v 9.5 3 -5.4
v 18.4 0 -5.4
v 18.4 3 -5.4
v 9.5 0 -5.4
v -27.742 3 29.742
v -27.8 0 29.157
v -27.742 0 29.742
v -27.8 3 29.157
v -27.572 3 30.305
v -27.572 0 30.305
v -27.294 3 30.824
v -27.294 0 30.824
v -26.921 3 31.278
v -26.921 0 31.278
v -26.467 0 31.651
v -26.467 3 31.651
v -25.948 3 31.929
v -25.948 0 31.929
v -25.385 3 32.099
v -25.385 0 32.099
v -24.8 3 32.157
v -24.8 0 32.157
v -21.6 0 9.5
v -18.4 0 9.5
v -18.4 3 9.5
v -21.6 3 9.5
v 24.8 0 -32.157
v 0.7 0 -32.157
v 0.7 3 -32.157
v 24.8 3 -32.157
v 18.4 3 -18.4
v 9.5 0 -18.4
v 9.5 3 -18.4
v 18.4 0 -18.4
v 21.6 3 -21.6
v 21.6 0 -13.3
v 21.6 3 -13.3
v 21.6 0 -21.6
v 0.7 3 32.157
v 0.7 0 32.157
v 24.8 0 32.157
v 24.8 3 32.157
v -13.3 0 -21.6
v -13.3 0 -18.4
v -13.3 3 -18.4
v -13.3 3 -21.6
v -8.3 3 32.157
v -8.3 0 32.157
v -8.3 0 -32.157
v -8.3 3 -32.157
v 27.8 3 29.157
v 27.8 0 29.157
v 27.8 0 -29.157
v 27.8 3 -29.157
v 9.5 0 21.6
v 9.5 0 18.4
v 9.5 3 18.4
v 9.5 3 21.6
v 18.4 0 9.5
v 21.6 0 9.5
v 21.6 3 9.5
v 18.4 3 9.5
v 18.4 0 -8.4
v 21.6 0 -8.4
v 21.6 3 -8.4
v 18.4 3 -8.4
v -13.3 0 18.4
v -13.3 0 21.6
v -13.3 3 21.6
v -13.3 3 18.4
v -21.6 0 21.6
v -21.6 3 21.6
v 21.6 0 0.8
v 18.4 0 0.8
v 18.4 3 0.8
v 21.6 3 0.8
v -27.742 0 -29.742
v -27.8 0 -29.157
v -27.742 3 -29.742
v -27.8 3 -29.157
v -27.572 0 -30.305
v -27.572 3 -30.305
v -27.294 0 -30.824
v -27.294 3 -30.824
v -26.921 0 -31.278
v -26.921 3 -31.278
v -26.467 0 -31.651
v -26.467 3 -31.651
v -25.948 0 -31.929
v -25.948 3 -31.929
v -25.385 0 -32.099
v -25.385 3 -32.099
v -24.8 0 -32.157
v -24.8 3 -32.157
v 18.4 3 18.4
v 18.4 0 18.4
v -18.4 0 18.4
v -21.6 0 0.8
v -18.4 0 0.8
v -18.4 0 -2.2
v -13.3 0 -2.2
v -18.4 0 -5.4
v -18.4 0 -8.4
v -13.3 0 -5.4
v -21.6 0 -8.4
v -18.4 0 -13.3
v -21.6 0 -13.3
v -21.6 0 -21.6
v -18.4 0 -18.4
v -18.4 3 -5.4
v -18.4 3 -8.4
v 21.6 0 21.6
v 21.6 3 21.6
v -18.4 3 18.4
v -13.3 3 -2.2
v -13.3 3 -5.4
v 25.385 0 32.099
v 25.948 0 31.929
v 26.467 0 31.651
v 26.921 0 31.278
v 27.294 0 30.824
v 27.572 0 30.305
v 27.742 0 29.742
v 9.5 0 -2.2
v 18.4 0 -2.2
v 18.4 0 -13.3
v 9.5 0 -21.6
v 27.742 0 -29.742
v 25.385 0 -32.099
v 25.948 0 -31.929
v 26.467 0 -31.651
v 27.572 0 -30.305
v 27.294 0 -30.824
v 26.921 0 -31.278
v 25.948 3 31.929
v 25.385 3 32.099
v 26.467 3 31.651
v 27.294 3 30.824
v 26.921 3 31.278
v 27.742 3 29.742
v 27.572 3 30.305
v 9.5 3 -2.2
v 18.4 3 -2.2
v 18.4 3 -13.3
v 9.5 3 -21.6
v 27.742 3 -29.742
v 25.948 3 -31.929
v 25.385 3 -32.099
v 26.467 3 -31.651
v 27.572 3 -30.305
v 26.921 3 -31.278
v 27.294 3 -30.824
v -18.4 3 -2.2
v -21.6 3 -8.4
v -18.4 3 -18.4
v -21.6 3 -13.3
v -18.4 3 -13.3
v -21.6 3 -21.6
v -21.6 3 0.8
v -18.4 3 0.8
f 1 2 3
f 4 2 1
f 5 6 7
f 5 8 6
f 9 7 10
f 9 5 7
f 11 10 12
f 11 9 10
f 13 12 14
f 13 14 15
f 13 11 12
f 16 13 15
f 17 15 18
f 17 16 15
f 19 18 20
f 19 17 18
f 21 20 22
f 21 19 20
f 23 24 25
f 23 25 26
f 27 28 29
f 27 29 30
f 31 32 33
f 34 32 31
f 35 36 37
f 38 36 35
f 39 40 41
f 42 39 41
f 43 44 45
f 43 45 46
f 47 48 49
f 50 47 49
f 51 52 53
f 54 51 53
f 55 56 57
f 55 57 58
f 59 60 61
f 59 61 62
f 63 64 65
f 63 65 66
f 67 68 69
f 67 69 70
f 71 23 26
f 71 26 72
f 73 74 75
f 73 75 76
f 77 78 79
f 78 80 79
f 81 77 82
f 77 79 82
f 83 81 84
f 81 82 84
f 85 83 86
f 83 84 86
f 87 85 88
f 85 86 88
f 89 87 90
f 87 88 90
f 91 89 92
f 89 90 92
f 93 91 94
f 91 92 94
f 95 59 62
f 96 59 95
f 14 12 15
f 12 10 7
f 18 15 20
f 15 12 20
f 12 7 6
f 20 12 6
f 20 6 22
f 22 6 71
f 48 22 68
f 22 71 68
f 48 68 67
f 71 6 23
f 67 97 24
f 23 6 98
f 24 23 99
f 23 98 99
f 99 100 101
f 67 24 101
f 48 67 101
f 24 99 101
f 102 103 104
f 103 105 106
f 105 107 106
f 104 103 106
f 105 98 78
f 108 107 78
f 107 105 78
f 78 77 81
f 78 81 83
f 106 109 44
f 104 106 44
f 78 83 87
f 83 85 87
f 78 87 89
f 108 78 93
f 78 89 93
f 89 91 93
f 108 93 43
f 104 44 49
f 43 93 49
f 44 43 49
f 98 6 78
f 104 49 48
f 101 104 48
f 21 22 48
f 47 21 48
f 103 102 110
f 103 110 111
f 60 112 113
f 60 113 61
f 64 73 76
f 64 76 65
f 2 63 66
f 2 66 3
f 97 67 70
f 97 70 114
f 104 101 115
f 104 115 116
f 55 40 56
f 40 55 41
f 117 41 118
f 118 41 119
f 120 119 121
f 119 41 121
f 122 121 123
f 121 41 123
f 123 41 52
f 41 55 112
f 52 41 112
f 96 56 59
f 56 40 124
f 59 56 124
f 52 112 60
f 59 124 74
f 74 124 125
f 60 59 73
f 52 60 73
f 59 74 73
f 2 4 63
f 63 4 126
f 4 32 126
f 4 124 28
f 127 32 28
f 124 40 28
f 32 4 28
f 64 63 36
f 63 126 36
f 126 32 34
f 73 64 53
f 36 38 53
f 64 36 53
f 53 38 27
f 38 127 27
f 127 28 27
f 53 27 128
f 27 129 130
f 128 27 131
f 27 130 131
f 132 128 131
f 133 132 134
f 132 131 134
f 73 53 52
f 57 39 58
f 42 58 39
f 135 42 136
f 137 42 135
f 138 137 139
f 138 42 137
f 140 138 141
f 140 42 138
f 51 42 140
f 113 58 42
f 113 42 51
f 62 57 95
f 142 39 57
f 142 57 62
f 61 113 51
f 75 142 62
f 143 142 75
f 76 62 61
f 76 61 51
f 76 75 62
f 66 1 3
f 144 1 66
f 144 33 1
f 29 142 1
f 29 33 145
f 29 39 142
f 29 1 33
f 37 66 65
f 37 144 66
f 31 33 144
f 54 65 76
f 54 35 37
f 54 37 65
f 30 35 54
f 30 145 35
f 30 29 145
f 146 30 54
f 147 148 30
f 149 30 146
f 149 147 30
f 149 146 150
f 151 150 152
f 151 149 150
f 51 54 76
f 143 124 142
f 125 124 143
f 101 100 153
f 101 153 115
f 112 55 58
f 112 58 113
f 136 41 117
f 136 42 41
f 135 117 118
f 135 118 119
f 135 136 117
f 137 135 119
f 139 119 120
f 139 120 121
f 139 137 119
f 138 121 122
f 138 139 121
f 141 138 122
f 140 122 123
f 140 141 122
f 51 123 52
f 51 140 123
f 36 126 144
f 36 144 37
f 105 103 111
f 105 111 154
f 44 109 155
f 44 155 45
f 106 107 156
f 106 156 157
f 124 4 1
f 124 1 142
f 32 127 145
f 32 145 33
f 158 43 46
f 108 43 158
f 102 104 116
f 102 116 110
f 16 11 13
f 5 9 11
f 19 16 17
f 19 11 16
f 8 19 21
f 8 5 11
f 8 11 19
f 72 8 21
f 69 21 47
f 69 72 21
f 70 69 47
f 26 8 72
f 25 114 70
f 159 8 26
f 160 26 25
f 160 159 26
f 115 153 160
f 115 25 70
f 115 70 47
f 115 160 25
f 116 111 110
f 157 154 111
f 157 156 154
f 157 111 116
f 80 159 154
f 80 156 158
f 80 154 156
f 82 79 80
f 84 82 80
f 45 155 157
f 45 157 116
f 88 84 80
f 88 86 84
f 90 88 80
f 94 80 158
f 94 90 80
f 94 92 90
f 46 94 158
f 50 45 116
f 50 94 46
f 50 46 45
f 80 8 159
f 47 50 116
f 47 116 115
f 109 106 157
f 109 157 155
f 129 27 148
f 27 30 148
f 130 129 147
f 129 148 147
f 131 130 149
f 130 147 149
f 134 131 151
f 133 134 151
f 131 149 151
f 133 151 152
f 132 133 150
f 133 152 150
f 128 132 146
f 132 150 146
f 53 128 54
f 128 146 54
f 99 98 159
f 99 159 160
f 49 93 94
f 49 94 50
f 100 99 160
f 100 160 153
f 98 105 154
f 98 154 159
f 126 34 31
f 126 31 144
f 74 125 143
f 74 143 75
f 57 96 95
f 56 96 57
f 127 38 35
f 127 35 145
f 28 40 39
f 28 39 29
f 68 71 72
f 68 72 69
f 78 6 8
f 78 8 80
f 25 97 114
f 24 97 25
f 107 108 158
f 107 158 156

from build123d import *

# Parameters (mm, degrees)
SKETCH1_W             = 27.1
SKETCH1_H             = 64.314018284
BOSS_EXTRUDE1_DEPTH   = 3
SKETCH1_W_2           = 19.5
BOSS_EXTRUDE1_2_DEPTH = 3
CUT_EXTRUDE1_DEPTH    = 4
FILLET1_R             = 3
FILLET2_R             = 3


with BuildPart() as part:
    # Sketch1 → Boss-Extrude1 (new body)
    with BuildSketch(Plane(origin=(0, 0, 0), x_dir=(1, 0, 0), z_dir=(0, 1, 0))):
        with Locations((14.25, 0)):
            Rectangle(SKETCH1_W, SKETCH1_H)
    extrude(amount=BOSS_EXTRUDE1_DEPTH)


with BuildPart() as body_2:
    # Sketch1 → Boss-Extrude1 2 (new body)
    with BuildSketch(Plane(origin=(0, 0, 0), x_dir=(1, 0, 0), z_dir=(0, 1, 0))):
        with Locations((-18.05, 0)):
            Rectangle(SKETCH1_W_2, SKETCH1_H)
    extrude(amount=BOSS_EXTRUDE1_2_DEPTH)


with BuildPart() as cut_extrude1_tool:
    # Sketch4 → Cut-Extrude1 (new body, through all)
    with BuildSketch(Plane(origin=(0, 0, 0), x_dir=(1, 0, 0), z_dir=(0, 1, 0))):
        Polygon((18.4, 2.2), (18.4, -0.8), (21.6, -0.8), (21.6, 8.4), (18.4, 8.4), (18.4, 5.4), (9.5, 5.4), (9.5, 2.2), align=None)
        Polygon((9.5, -18.4), (9.5, -21.6), (21.6, -21.6), (21.6, -9.5), (18.4, -9.5), (18.4, -18.4), align=None)
        Polygon((-13.3, -18.4), (-18.4, -18.4), (-18.4, -9.5), (-21.6, -9.5), (-21.6, -21.6), (-13.3, -21.6), align=None)
        Polygon((-18.4, 5.4), (-18.4, 8.4), (-21.6, 8.4), (-21.6, -0.8), (-18.4, -0.8), (-18.4, 2.2), (-13.3, 2.2), (-13.3, 5.4), align=None)
        Polygon((-18.4, 18.4), (-13.3, 18.4), (-13.3, 21.6), (-21.6, 21.6), (-21.6, 13.3), (-18.4, 13.3), align=None)
        Polygon((18.4, 18.4), (18.4, 13.3), (21.6, 13.3), (21.6, 21.6), (9.5, 21.6), (9.5, 18.4), align=None)
    extrude(amount=CUT_EXTRUDE1_DEPTH)


with BuildPart() as part_1:
    add(part.part)

    # Cut-Extrude1: cut by cut_extrude1_tool
    add(cut_extrude1_tool.part, mode=Mode.SUBTRACT)

    # Fillet1
    fillet1_edges = [part_1.edges().sort_by_distance(p)[0] for p in [
        (27.8, 1.5, -32.157009142),
        (27.8, 1.5, 32.157009142),
    ]]
    fillet(fillet1_edges, radius=FILLET1_R)


with BuildPart() as body_2_1:
    add(body_2.part)

    # Cut-Extrude1: cut by cut_extrude1_tool
    add(cut_extrude1_tool.part, mode=Mode.SUBTRACT)

    # Fillet2
    fillet2_edges = [body_2_1.edges().sort_by_distance(p)[0] for p in [
        (-27.8, 1.5, 32.157009142),
        (-27.8, 1.5, -32.157009142),
    ]]
    fillet(fillet2_edges, radius=FILLET2_R)


solid = Compound([part_1.part, body_2_1.part])
